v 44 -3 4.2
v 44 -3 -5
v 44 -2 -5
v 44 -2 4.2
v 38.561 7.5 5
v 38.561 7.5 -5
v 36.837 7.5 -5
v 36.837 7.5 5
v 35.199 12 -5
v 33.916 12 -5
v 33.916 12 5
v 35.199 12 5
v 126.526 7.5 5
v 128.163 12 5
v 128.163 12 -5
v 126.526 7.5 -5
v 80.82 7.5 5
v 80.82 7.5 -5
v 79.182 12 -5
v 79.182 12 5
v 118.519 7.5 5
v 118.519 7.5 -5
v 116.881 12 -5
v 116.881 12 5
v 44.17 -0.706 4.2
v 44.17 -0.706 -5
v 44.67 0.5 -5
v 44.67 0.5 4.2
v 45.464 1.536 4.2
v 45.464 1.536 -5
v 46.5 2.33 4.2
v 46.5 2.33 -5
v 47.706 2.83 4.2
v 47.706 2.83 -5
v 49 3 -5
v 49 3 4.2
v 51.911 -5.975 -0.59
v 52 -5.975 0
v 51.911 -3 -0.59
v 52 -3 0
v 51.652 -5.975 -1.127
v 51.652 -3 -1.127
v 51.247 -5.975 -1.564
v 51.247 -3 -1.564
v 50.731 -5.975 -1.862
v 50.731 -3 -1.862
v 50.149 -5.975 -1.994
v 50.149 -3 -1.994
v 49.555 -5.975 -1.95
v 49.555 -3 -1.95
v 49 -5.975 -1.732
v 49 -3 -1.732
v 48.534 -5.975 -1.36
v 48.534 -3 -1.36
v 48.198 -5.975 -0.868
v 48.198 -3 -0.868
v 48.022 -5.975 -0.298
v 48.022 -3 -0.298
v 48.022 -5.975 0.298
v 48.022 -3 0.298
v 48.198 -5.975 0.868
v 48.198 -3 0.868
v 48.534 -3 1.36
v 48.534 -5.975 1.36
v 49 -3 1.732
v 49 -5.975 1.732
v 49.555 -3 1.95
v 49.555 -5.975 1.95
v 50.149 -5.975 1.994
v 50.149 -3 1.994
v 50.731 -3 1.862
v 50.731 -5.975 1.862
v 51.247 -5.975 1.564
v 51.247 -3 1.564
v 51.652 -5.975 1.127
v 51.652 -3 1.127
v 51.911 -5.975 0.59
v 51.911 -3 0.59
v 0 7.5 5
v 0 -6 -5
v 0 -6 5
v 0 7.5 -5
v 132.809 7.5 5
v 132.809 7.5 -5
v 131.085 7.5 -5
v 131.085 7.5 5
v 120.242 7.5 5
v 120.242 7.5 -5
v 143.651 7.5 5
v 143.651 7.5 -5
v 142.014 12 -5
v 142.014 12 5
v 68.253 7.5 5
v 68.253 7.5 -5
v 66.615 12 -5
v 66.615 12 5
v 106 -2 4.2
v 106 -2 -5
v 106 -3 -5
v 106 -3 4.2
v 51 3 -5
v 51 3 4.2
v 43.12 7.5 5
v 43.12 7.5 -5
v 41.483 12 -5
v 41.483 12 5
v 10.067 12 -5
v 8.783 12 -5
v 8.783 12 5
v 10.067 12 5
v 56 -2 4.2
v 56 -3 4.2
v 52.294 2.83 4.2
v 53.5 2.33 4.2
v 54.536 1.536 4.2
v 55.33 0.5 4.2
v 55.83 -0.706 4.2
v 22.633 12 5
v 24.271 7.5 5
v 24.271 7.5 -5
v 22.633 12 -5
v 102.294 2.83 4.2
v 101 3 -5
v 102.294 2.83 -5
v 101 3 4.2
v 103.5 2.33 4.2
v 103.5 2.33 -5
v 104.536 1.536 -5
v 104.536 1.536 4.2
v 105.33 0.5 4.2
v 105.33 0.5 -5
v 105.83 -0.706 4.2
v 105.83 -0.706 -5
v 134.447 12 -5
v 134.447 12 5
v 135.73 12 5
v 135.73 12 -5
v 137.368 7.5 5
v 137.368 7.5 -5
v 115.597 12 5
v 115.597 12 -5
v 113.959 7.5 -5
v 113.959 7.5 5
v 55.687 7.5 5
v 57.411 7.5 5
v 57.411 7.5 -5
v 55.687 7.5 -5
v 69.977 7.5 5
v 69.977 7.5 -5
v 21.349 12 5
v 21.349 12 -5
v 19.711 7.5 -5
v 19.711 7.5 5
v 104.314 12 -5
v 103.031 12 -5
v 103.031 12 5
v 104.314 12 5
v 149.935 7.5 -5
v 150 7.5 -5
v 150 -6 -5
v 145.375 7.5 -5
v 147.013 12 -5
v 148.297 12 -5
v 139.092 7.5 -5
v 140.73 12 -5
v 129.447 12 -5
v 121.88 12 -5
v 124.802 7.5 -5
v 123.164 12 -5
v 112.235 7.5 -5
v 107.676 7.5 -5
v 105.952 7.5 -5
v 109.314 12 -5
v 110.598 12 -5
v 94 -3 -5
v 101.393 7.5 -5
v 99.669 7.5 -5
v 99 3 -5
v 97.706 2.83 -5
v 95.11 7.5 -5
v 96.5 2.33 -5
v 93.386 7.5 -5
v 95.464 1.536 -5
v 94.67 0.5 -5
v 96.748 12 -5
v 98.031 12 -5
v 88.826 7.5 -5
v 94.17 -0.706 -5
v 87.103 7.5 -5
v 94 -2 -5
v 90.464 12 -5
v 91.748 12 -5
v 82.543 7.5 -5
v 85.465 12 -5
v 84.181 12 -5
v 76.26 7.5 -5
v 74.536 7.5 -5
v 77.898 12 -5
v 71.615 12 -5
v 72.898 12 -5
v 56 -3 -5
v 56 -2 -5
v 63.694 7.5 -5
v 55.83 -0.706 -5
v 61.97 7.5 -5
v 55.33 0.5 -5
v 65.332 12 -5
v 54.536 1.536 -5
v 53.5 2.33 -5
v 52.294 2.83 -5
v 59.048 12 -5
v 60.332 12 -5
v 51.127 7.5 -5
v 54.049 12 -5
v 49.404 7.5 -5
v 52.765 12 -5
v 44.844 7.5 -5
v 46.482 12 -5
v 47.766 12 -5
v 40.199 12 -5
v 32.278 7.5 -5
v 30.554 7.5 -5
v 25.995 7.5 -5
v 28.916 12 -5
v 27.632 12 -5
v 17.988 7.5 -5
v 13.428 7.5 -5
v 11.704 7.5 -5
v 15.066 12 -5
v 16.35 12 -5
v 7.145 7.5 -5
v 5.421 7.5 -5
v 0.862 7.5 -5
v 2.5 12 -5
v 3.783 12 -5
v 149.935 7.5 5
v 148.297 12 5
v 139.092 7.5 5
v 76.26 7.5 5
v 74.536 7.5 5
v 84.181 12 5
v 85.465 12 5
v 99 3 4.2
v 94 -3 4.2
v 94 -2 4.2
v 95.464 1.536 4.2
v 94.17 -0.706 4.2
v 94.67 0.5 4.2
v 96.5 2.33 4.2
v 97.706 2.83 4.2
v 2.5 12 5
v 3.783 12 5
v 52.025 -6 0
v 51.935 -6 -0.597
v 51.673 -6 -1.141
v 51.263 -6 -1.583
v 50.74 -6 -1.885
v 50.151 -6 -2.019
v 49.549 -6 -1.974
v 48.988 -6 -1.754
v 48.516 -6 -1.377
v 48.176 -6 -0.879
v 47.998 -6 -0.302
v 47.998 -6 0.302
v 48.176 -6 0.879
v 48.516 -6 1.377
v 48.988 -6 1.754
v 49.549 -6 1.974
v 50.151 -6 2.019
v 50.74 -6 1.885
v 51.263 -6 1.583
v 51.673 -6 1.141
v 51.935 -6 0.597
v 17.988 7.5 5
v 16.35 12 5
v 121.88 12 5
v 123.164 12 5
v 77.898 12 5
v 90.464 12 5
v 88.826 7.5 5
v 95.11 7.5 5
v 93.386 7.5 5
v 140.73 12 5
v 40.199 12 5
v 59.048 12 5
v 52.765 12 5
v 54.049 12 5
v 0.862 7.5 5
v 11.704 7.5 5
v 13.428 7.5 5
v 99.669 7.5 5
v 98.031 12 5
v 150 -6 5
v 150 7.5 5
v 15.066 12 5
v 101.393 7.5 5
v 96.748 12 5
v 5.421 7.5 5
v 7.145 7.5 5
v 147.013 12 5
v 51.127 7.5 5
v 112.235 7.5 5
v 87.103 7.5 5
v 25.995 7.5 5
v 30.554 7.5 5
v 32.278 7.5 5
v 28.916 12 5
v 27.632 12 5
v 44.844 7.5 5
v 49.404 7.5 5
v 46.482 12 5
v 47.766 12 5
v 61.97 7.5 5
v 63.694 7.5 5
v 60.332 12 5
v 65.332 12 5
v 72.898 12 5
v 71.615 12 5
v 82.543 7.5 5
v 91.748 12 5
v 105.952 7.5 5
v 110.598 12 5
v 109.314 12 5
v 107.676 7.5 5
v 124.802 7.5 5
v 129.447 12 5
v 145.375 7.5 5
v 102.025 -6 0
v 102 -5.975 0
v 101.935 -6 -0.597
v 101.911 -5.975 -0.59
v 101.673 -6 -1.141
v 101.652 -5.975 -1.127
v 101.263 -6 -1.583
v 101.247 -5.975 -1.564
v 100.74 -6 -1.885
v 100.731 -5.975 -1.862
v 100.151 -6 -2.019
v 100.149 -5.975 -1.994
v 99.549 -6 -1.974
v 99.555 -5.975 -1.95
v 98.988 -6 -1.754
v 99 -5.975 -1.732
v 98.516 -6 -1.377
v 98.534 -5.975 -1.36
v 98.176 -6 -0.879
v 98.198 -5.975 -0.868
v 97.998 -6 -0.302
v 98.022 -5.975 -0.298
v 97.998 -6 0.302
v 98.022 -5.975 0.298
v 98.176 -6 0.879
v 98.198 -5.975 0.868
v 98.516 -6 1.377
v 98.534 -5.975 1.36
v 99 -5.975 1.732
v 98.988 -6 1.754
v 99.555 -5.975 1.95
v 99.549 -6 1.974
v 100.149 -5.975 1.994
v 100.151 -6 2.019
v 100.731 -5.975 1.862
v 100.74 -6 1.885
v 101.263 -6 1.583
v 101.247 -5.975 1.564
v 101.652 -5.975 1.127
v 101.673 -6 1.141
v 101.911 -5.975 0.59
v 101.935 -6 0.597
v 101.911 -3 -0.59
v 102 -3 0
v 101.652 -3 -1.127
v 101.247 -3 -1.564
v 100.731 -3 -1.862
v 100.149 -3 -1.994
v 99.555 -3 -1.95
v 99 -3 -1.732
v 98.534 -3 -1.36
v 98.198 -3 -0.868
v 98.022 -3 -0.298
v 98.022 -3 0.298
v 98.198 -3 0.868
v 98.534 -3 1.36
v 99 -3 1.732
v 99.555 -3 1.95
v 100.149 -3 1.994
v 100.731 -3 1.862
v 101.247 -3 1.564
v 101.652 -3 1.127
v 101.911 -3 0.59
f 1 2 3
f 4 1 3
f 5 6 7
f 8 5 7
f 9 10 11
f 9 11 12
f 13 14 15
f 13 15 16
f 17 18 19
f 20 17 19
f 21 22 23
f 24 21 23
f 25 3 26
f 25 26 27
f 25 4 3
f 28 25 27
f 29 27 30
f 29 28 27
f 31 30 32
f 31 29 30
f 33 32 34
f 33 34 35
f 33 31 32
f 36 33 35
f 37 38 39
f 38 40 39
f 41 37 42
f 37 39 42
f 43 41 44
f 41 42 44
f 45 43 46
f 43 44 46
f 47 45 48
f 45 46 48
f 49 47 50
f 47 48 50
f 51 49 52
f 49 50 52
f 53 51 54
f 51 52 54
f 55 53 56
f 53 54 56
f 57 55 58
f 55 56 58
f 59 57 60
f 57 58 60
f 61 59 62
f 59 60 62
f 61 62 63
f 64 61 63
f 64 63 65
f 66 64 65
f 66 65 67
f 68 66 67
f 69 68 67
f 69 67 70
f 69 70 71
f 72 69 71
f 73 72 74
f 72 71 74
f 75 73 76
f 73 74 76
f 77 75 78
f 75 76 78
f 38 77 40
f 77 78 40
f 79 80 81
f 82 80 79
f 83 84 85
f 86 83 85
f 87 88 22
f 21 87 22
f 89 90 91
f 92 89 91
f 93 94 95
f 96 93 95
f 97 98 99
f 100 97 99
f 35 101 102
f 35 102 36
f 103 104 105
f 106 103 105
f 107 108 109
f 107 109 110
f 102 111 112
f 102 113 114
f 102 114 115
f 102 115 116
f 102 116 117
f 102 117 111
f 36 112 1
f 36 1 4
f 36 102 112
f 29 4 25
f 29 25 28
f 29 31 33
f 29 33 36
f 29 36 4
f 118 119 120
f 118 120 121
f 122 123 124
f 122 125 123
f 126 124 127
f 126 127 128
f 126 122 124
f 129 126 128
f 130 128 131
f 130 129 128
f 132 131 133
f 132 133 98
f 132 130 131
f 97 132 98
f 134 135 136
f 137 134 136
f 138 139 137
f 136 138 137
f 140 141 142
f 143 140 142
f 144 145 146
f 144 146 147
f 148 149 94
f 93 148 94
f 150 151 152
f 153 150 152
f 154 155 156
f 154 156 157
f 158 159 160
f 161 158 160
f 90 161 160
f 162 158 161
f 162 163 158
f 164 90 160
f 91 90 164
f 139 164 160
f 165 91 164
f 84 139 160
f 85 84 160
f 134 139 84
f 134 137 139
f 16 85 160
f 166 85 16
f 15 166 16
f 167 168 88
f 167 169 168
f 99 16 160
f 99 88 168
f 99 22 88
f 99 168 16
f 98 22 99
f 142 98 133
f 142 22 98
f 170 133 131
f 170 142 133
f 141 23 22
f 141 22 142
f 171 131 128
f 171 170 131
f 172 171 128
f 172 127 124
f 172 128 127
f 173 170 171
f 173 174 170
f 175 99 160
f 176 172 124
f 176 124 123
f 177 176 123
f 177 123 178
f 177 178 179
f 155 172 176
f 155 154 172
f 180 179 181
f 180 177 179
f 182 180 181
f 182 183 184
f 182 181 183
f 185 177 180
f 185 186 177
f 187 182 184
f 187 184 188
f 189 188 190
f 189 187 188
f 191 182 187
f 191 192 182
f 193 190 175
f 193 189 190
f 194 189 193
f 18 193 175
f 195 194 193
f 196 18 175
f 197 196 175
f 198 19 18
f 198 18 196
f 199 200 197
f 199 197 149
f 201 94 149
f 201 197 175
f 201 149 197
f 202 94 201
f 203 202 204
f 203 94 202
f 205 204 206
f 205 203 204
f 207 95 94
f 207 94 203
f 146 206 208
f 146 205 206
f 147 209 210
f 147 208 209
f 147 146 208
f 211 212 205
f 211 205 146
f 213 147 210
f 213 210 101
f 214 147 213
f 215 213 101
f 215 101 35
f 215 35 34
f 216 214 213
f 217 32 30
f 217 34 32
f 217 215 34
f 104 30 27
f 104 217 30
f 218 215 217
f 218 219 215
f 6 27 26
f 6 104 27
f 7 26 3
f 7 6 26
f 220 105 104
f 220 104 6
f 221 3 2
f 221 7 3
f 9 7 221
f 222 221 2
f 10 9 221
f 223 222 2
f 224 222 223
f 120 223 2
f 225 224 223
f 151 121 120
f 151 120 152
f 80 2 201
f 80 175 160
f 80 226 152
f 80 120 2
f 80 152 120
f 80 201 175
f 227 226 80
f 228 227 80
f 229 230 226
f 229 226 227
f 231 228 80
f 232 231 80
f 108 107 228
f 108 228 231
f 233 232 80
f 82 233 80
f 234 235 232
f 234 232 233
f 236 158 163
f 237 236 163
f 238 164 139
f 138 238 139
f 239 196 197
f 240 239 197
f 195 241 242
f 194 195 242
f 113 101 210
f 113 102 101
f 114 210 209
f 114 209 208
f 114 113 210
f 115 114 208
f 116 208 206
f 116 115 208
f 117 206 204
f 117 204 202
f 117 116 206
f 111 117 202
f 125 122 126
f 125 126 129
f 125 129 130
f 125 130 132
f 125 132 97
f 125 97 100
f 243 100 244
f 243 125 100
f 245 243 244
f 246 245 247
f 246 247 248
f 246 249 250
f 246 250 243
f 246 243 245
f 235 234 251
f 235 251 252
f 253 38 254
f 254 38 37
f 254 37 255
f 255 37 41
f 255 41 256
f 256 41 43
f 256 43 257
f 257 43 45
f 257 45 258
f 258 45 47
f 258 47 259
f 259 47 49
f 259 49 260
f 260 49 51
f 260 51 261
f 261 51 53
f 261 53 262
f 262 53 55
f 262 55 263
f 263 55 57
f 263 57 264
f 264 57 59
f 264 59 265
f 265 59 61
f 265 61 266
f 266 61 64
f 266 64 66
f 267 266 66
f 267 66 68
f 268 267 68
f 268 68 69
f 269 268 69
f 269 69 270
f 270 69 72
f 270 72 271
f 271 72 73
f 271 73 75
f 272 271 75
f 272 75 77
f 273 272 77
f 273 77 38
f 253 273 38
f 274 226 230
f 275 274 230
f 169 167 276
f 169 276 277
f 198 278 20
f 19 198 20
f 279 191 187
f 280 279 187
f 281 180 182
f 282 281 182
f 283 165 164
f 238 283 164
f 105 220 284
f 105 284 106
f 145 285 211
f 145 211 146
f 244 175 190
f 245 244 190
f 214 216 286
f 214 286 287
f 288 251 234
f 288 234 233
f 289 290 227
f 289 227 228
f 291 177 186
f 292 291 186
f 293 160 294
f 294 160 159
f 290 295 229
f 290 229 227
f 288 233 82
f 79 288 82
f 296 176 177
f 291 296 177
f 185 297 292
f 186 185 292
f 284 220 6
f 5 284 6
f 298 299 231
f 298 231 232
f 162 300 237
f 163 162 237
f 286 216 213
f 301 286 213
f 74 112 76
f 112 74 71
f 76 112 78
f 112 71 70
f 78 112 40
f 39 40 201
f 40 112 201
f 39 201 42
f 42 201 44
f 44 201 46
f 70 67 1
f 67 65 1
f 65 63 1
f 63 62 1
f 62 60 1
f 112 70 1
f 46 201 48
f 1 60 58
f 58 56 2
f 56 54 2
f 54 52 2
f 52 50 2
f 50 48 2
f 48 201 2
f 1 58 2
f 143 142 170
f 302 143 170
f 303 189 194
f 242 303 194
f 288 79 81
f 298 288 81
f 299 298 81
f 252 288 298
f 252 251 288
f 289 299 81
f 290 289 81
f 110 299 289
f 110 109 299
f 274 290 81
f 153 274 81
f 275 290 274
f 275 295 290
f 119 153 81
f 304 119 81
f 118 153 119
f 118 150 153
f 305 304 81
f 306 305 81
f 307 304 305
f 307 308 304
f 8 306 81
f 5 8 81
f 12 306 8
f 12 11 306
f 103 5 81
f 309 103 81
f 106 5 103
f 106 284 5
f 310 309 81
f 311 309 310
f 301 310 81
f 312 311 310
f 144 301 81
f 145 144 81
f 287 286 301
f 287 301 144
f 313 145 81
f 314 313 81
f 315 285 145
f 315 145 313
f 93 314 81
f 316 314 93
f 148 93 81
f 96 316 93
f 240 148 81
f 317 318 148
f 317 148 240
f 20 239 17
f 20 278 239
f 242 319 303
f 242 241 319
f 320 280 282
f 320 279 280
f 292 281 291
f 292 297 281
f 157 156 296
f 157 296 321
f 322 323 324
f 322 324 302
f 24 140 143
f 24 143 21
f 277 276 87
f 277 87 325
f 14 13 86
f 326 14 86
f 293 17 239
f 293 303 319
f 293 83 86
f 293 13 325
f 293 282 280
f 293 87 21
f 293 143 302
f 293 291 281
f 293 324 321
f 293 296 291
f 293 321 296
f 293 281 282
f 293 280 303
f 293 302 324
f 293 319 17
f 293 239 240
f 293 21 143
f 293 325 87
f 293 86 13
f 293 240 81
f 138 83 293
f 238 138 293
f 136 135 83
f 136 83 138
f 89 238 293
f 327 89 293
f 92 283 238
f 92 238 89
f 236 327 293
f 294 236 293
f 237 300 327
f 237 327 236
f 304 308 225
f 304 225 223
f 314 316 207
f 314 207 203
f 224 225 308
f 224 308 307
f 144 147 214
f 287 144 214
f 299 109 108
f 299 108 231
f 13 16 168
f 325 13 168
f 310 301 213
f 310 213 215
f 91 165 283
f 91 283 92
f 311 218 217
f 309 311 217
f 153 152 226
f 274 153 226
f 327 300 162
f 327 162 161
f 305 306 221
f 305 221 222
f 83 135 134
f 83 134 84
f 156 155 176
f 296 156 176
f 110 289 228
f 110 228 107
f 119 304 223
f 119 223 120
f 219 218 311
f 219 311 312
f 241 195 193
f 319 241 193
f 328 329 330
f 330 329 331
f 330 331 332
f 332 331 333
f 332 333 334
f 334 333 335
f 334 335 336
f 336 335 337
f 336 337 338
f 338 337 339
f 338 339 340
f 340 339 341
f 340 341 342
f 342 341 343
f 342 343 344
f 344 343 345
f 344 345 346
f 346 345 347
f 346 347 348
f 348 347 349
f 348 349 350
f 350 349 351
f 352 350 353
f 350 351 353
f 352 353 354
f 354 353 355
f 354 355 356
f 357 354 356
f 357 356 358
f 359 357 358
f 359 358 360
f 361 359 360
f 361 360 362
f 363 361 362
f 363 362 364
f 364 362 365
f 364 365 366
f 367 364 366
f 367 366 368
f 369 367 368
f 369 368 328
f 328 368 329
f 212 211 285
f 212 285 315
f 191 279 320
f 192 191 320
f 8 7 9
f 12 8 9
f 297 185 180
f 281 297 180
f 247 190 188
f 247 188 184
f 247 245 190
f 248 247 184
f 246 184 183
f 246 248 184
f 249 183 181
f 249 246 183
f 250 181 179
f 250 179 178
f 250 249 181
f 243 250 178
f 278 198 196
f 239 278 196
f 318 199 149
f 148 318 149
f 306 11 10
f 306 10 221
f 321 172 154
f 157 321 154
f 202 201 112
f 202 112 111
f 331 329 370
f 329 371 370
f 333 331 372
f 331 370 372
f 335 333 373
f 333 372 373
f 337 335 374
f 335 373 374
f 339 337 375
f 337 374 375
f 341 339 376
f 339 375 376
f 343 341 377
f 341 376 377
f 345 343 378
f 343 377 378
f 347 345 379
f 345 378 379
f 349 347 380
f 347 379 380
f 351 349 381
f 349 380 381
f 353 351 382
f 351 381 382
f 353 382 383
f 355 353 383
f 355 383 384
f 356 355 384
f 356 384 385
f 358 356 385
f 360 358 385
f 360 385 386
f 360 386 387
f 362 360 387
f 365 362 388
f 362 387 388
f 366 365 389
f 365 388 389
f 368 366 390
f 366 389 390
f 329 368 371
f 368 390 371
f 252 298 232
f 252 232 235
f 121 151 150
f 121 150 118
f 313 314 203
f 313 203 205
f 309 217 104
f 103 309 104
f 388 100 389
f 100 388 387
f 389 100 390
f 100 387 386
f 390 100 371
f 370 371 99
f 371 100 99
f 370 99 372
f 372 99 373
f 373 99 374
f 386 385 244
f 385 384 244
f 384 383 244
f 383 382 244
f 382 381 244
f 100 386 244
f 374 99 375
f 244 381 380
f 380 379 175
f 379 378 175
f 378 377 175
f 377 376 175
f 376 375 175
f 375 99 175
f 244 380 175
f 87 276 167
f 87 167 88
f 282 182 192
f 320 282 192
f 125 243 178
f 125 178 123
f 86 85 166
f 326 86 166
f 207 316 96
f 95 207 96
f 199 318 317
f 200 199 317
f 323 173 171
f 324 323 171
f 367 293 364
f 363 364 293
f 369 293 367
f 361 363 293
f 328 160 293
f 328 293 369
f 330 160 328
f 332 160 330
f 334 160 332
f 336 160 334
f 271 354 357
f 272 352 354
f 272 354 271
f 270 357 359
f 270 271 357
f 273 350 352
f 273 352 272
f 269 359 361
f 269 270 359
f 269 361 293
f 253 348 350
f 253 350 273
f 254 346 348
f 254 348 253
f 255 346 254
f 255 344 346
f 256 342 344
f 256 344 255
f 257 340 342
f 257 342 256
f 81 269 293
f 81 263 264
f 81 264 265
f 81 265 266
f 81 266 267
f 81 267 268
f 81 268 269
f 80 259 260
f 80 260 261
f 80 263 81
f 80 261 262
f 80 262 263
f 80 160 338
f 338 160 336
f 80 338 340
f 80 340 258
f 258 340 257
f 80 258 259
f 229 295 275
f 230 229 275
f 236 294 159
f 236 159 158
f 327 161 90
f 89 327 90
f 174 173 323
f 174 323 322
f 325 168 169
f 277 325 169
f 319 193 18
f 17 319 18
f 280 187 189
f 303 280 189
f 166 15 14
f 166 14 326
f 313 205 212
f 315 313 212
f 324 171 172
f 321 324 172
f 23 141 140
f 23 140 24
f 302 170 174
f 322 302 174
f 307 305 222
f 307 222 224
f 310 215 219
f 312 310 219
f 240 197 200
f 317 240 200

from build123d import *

# Parameters (mm, degrees)
BLANKSKE_W                      = 150
BLANKSKE_H                      = 12
BLANK_DEPTH                     = 5
TOOTHCUTSIM_DEPTH               = 151.562279473
TEETHCUTS_COUNT                 = 25
TEETHCUTS_PITCH                 = 6.2831853
SKETCH1_W                       = 150
SKETCH1_H                       = 6
BOSS_EXTRUDE1_DEPTH             = 10
MIRROR1_COPY_1_DEPTH            = 151.562279473
MIRROR1_COPY_2_DEPTH            = 151.562279473
MIRROR1_COPY_3_DEPTH            = 151.562279473
MIRROR1_COPY_4_DEPTH            = 151.562279473
MIRROR1_COPY_5_DEPTH            = 151.562279473
MIRROR1_COPY_6_DEPTH            = 151.562279473
MIRROR1_COPY_7_DEPTH            = 151.562279473
MIRROR1_COPY_8_DEPTH            = 151.562279473
MIRROR1_COPY_9_DEPTH            = 151.562279473
MIRROR1_COPY_10_DEPTH           = 151.562279473
MIRROR1_COPY_11_DEPTH           = 151.562279473
MIRROR1_COPY_12_DEPTH           = 151.562279473
MIRROR1_COPY_13_DEPTH           = 151.562279473
MIRROR1_COPY_14_DEPTH           = 151.562279473
MIRROR1_COPY_15_DEPTH           = 151.562279473
MIRROR1_COPY_16_DEPTH           = 151.562279473
MIRROR1_COPY_17_DEPTH           = 151.562279473
MIRROR1_COPY_18_DEPTH           = 151.562279473
MIRROR1_COPY_19_DEPTH           = 151.562279473
MIRROR1_COPY_20_DEPTH           = 151.562279473
MIRROR1_COPY_21_DEPTH           = 151.562279473
MIRROR1_COPY_22_DEPTH           = 151.562279473
MIRROR1_COPY_23_DEPTH           = 151.562279473
MIRROR1_COPY_24_DEPTH           = 151.562279473
MIRROR1_COPY_25_DEPTH           = 151.562279473
F_4_0MM_DOWEL_HOLE1_D           = 4
F_4_0MM_DOWEL_HOLE1_DEPTH       = 3
F_4_0MM_DOWEL_HOLE1_CSINK_D     = 4.05
F_4_0MM_DOWEL_HOLE1_CSINK_ANGLE = 90
F_4_0MM_DOWEL_HOLE1_TIP         = 1.201721238
SKETCH7_W                       = 12
SKETCH7_H                       = 6
CUT_EXTRUDE1_DEPTH              = 9.2
FILLET2_R                       = 5
FILLET3_R                       = 5


with BuildPart() as part:
    # BlankSke → Blank (new body)
    with BuildSketch(Plane.XY):
        with Locations((75, 6)):
            Rectangle(BLANKSKE_W, BLANKSKE_H)
    blank = extrude(amount=-BLANK_DEPTH)

    # TooCutSkeSim → ToothCutSim (cut, through all)
    with BuildSketch(Plane.XY):
        Polygon((0.861870739, 7.5), (-0.861870739, 7.5), (-2.508981637, 12.0254), (2.508981637, 12.0254), align=None)
    toothcutsim = extrude(amount=-TOOTHCUTSIM_DEPTH, mode=Mode.SUBTRACT)

    # TeethCuts: ToothCutSim ×25
    with Locations(*[(i * TEETHCUTS_PITCH, 0, 0) for i in range(1, TEETHCUTS_COUNT)]):
        add(toothcutsim, mode=Mode.SUBTRACT)

    # Sketch1 → Boss-Extrude1 (add)
    with BuildSketch(Plane(origin=(0, 0, -5), x_dir=(-1, 0, 0), z_dir=(0, 0, -1))):
        with Locations((-75, -3)):
            Rectangle(SKETCH1_W, SKETCH1_H)
    extrude(amount=-BOSS_EXTRUDE1_DEPTH)

    # Mirror1: Blank across plane
    add(blank.mirror(Plane.XY))

    # Mirror1 copy 1 sketch → Mirror1 copy 1 (cut, through all)
    with BuildSketch(Plane(origin=(6.2831853, 0, 0), x_dir=(1, 0, 0), z_dir=(0, 0, -1))):
        Polygon((0.861870739, -7.5), (-0.861870739, -7.5), (-2.508981637, -12.0254), (2.508981637, -12.0254), align=None)
    extrude(amount=-MIRROR1_COPY_1_DEPTH, mode=Mode.SUBTRACT)

    # Mirror1 copy 2 sketch → Mirror1 copy 2 (cut, through all)
    with BuildSketch(Plane(origin=(12.5663706, 0, 0), x_dir=(1, 0, 0), z_dir=(0, 0, -1))):
        Polygon((0.861870739, -7.5), (-0.861870739, -7.5), (-2.508981637, -12.0254), (2.508981637, -12.0254), align=None)
    extrude(amount=-MIRROR1_COPY_2_DEPTH, mode=Mode.SUBTRACT)

    # Mirror1 copy 3 sketch → Mirror1 copy 3 (cut, through all)
    with BuildSketch(Plane(origin=(18.8495559, 0, 0), x_dir=(1, 0, 0), z_dir=(0, 0, -1))):
        Polygon((0.861870739, -7.5), (-0.861870739, -7.5), (-2.508981637, -12.0254), (2.508981637, -12.0254), align=None)
    extrude(amount=-MIRROR1_COPY_3_DEPTH, mode=Mode.SUBTRACT)

    # Mirror1 copy 4 sketch → Mirror1 copy 4 (cut, through all)
    with BuildSketch(Plane(origin=(25.1327412, 0, 0), x_dir=(1, 0, 0), z_dir=(0, 0, -1))):
        Polygon((0.861870739, -7.5), (-0.861870739, -7.5), (-2.508981637, -12.0254), (2.508981637, -12.0254), align=None)
    extrude(amount=-MIRROR1_COPY_4_DEPTH, mode=Mode.SUBTRACT)

    # Mirror1 copy 5 sketch → Mirror1 copy 5 (cut, through all)
    with BuildSketch(Plane(origin=(31.4159265, 0, 0), x_dir=(1, 0, 0), z_dir=(0, 0, -1))):
        Polygon((0.861870739, -7.5), (-0.861870739, -7.5), (-2.508981637, -12.0254), (2.508981637, -12.0254), align=None)
    extrude(amount=-MIRROR1_COPY_5_DEPTH, mode=Mode.SUBTRACT)

    # Mirror1 copy 6 sketch → Mirror1 copy 6 (cut, through all)
    with BuildSketch(Plane(origin=(37.6991118, 0, 0), x_dir=(1, 0, 0), z_dir=(0, 0, -1))):
        Polygon((0.861870739, -7.5), (-0.861870739, -7.5), (-2.508981637, -12.0254), (2.508981637, -12.0254), align=None)
    extrude(amount=-MIRROR1_COPY_6_DEPTH, mode=Mode.SUBTRACT)

    # Mirror1 copy 7 sketch → Mirror1 copy 7 (cut, through all)
    with BuildSketch(Plane(origin=(43.9822971, 0, 0), x_dir=(1, 0, 0), z_dir=(0, 0, -1))):
        Polygon((0.861870739, -7.5), (-0.861870739, -7.5), (-2.508981637, -12.0254), (2.508981637, -12.0254), align=None)
    extrude(amount=-MIRROR1_COPY_7_DEPTH, mode=Mode.SUBTRACT)

    # Mirror1 copy 8 sketch → Mirror1 copy 8 (cut, through all)
    with BuildSketch(Plane(origin=(50.2654824, 0, 0), x_dir=(1, 0, 0), z_dir=(0, 0, -1))):
        Polygon((0.861870739, -7.5), (-0.861870739, -7.5), (-2.508981637, -12.0254), (2.508981637, -12.0254), align=None)
    extrude(amount=-MIRROR1_COPY_8_DEPTH, mode=Mode.SUBTRACT)

    # Mirror1 copy 9 sketch → Mirror1 copy 9 (cut, through all)
    with BuildSketch(Plane(origin=(56.5486677, 0, 0), x_dir=(1, 0, 0), z_dir=(0, 0, -1))):
        Polygon((0.861870739, -7.5), (-0.861870739, -7.5), (-2.508981637, -12.0254), (2.508981637, -12.0254), align=None)
    extrude(amount=-MIRROR1_COPY_9_DEPTH, mode=Mode.SUBTRACT)

    # Mirror1 copy 10 sketch → Mirror1 copy 10 (cut, through all)
    with BuildSketch(Plane(origin=(62.831853, 0, 0), x_dir=(1, 0, 0), z_dir=(0, 0, -1))):
        Polygon((0.861870739, -7.5), (-0.861870739, -7.5), (-2.508981637, -12.0254), (2.508981637, -12.0254), align=None)
    extrude(amount=-MIRROR1_COPY_10_DEPTH, mode=Mode.SUBTRACT)

    # Mirror1 copy 11 sketch → Mirror1 copy 11 (cut, through all)
    with BuildSketch(Plane(origin=(69.1150383, 0, 0), x_dir=(1, 0, 0), z_dir=(0, 0, -1))):
        Polygon((0.861870739, -7.5), (-0.861870739, -7.5), (-2.508981637, -12.0254), (2.508981637, -12.0254), align=None)
    extrude(amount=-MIRROR1_COPY_11_DEPTH, mode=Mode.SUBTRACT)

    # Mirror1 copy 12 sketch → Mirror1 copy 12 (cut, through all)
    with BuildSketch(Plane(origin=(75.3982236, 0, 0), x_dir=(1, 0, 0), z_dir=(0, 0, -1))):
        Polygon((0.861870739, -7.5), (-0.861870739, -7.5), (-2.508981637, -12.0254), (2.508981637, -12.0254), align=None)
    extrude(amount=-MIRROR1_COPY_12_DEPTH, mode=Mode.SUBTRACT)

    # Mirror1 copy 13 sketch → Mirror1 copy 13 (cut, through all)
    with BuildSketch(Plane(origin=(81.6814089, 0, 0), x_dir=(1, 0, 0), z_dir=(0, 0, -1))):
        Polygon((0.861870739, -7.5), (-0.861870739, -7.5), (-2.508981637, -12.0254), (2.508981637, -12.0254), align=None)
    extrude(amount=-MIRROR1_COPY_13_DEPTH, mode=Mode.SUBTRACT)

    # Mirror1 copy 14 sketch → Mirror1 copy 14 (cut, through all)
    with BuildSketch(Plane(origin=(87.9645942, 0, 0), x_dir=(1, 0, 0), z_dir=(0, 0, -1))):
        Polygon((0.861870739, -7.5), (-0.861870739, -7.5), (-2.508981637, -12.0254), (2.508981637, -12.0254), align=None)
    extrude(amount=-MIRROR1_COPY_14_DEPTH, mode=Mode.SUBTRACT)

    # Mirror1 copy 15 sketch → Mirror1 copy 15 (cut, through all)
    with BuildSketch(Plane(origin=(94.2477795, 0, 0), x_dir=(1, 0, 0), z_dir=(0, 0, -1))):
        Polygon((0.861870739, -7.5), (-0.861870739, -7.5), (-2.508981637, -12.0254), (2.508981637, -12.0254), align=None)
    extrude(amount=-MIRROR1_COPY_15_DEPTH, mode=Mode.SUBTRACT)

    # Mirror1 copy 16 sketch → Mirror1 copy 16 (cut, through all)
    with BuildSketch(Plane(origin=(100.5309648, 0, 0), x_dir=(1, 0, 0), z_dir=(0, 0, -1))):
        Polygon((0.861870739, -7.5), (-0.861870739, -7.5), (-2.508981637, -12.0254), (2.508981637, -12.0254), align=None)
    extrude(amount=-MIRROR1_COPY_16_DEPTH, mode=Mode.SUBTRACT)

    # Mirror1 copy 17 sketch → Mirror1 copy 17 (cut, through all)
    with BuildSketch(Plane(origin=(106.8141501, 0, 0), x_dir=(1, 0, 0), z_dir=(0, 0, -1))):
        Polygon((0.861870739, -7.5), (-0.861870739, -7.5), (-2.508981637, -12.0254), (2.508981637, -12.0254), align=None)
    extrude(amount=-MIRROR1_COPY_17_DEPTH, mode=Mode.SUBTRACT)

    # Mirror1 copy 18 sketch → Mirror1 copy 18 (cut, through all)
    with BuildSketch(Plane(origin=(113.0973354, 0, 0), x_dir=(1, 0, 0), z_dir=(0, 0, -1))):
        Polygon((0.861870739, -7.5), (-0.861870739, -7.5), (-2.508981637, -12.0254), (2.508981637, -12.0254), align=None)
    extrude(amount=-MIRROR1_COPY_18_DEPTH, mode=Mode.SUBTRACT)

    # Mirror1 copy 19 sketch → Mirror1 copy 19 (cut, through all)
    with BuildSketch(Plane(origin=(119.3805207, 0, 0), x_dir=(1, 0, 0), z_dir=(0, 0, -1))):
        Polygon((0.861870739, -7.5), (-0.861870739, -7.5), (-2.508981637, -12.0254), (2.508981637, -12.0254), align=None)
    extrude(amount=-MIRROR1_COPY_19_DEPTH, mode=Mode.SUBTRACT)

    # Mirror1 copy 20 sketch → Mirror1 copy 20 (cut, through all)
    with BuildSketch(Plane(origin=(125.663706, 0, 0), x_dir=(1, 0, 0), z_dir=(0, 0, -1))):
        Polygon((0.861870739, -7.5), (-0.861870739, -7.5), (-2.508981637, -12.0254), (2.508981637, -12.0254), align=None)
    extrude(amount=-MIRROR1_COPY_20_DEPTH, mode=Mode.SUBTRACT)

    # Mirror1 copy 21 sketch → Mirror1 copy 21 (cut, through all)
    with BuildSketch(Plane(origin=(131.9468913, 0, 0), x_dir=(1, 0, 0), z_dir=(0, 0, -1))):
        Polygon((0.861870739, -7.5), (-0.861870739, -7.5), (-2.508981637, -12.0254), (2.508981637, -12.0254), align=None)
    extrude(amount=-MIRROR1_COPY_21_DEPTH, mode=Mode.SUBTRACT)

    # Mirror1 copy 22 sketch → Mirror1 copy 22 (cut, through all)
    with BuildSketch(Plane(origin=(138.2300766, 0, 0), x_dir=(1, 0, 0), z_dir=(0, 0, -1))):
        Polygon((0.861870739, -7.5), (-0.861870739, -7.5), (-2.508981637, -12.0254), (2.508981637, -12.0254), align=None)
    extrude(amount=-MIRROR1_COPY_22_DEPTH, mode=Mode.SUBTRACT)

    # Mirror1 copy 23 sketch → Mirror1 copy 23 (cut, through all)
    with BuildSketch(Plane(origin=(144.5132619, 0, 0), x_dir=(1, 0, 0), z_dir=(0, 0, -1))):
        Polygon((0.861870739, -7.5), (-0.861870739, -7.5), (-2.508981637, -12.0254), (2.508981637, -12.0254), align=None)
    extrude(amount=-MIRROR1_COPY_23_DEPTH, mode=Mode.SUBTRACT)

    # Mirror1 copy 24 sketch → Mirror1 copy 24 (cut, through all)
    with BuildSketch(Plane(origin=(150.7964472, 0, 0), x_dir=(1, 0, 0), z_dir=(0, 0, -1))):
        Polygon((0.861870739, -7.5), (-0.861870739, -7.5), (-2.508981637, -12.0254), (2.508981637, -12.0254), align=None)
    extrude(amount=-MIRROR1_COPY_24_DEPTH, mode=Mode.SUBTRACT)

    # Mirror1 copy 25 sketch → Mirror1 copy 25 (cut, through all)
    with BuildSketch(Plane(origin=(0, 0, 0), x_dir=(1, 0, 0), z_dir=(0, 0, -1))):
        Polygon((0.861870739, -7.5), (-0.861870739, -7.5), (-2.508981637, -12.0254), (2.508981637, -12.0254), align=None)
    extrude(amount=-MIRROR1_COPY_25_DEPTH, mode=Mode.SUBTRACT)

    # Ø4.0mm Dowel Hole1
    with Locations(Plane(origin=(0, -6, 0), x_dir=(-1, 0, 0), z_dir=(0, -1, 0))):
        with Locations((-50, 0), (-100, 0)):
            CounterSinkHole(F_4_0MM_DOWEL_HOLE1_D / 2, F_4_0MM_DOWEL_HOLE1_CSINK_D / 2, depth=F_4_0MM_DOWEL_HOLE1_DEPTH, counter_sink_angle=F_4_0MM_DOWEL_HOLE1_CSINK_ANGLE)
            with Locations((0, 0, -(F_4_0MM_DOWEL_HOLE1_DEPTH + F_4_0MM_DOWEL_HOLE1_TIP / 2))):  # 118° drill point
                Cone(0, F_4_0MM_DOWEL_HOLE1_D / 2, F_4_0MM_DOWEL_HOLE1_TIP, mode=Mode.SUBTRACT)

    # Sketch7 → Cut-Extrude1 (cut)
    with BuildSketch(Plane(origin=(0, 0, -5), x_dir=(-1, 0, 0), z_dir=(0, 0, -1))):
        Polygon((-106, -3), (-100, -3), (-94, -3), (-94, 3), (-106, 3), align=None)
        with Locations((-50, 0)):
            Rectangle(SKETCH7_W, SKETCH7_H)
    extrude(amount=-CUT_EXTRUDE1_DEPTH, mode=Mode.SUBTRACT)

    # Fillet2
    fillet2_edges = [part.edges().sort_by_distance(p)[0] for p in [
        (106, 3, -0.4),
        (94, 3, -0.4),
    ]]
    fillet(fillet2_edges, radius=FILLET2_R)

    # Fillet3
    fillet3_edges = [part.edges().sort_by_distance(p)[0] for p in [
        (56, 3, -0.4),
        (44, 3, -0.4),
    ]]
    fillet(fillet3_edges, radius=FILLET3_R)


solid = part.part
